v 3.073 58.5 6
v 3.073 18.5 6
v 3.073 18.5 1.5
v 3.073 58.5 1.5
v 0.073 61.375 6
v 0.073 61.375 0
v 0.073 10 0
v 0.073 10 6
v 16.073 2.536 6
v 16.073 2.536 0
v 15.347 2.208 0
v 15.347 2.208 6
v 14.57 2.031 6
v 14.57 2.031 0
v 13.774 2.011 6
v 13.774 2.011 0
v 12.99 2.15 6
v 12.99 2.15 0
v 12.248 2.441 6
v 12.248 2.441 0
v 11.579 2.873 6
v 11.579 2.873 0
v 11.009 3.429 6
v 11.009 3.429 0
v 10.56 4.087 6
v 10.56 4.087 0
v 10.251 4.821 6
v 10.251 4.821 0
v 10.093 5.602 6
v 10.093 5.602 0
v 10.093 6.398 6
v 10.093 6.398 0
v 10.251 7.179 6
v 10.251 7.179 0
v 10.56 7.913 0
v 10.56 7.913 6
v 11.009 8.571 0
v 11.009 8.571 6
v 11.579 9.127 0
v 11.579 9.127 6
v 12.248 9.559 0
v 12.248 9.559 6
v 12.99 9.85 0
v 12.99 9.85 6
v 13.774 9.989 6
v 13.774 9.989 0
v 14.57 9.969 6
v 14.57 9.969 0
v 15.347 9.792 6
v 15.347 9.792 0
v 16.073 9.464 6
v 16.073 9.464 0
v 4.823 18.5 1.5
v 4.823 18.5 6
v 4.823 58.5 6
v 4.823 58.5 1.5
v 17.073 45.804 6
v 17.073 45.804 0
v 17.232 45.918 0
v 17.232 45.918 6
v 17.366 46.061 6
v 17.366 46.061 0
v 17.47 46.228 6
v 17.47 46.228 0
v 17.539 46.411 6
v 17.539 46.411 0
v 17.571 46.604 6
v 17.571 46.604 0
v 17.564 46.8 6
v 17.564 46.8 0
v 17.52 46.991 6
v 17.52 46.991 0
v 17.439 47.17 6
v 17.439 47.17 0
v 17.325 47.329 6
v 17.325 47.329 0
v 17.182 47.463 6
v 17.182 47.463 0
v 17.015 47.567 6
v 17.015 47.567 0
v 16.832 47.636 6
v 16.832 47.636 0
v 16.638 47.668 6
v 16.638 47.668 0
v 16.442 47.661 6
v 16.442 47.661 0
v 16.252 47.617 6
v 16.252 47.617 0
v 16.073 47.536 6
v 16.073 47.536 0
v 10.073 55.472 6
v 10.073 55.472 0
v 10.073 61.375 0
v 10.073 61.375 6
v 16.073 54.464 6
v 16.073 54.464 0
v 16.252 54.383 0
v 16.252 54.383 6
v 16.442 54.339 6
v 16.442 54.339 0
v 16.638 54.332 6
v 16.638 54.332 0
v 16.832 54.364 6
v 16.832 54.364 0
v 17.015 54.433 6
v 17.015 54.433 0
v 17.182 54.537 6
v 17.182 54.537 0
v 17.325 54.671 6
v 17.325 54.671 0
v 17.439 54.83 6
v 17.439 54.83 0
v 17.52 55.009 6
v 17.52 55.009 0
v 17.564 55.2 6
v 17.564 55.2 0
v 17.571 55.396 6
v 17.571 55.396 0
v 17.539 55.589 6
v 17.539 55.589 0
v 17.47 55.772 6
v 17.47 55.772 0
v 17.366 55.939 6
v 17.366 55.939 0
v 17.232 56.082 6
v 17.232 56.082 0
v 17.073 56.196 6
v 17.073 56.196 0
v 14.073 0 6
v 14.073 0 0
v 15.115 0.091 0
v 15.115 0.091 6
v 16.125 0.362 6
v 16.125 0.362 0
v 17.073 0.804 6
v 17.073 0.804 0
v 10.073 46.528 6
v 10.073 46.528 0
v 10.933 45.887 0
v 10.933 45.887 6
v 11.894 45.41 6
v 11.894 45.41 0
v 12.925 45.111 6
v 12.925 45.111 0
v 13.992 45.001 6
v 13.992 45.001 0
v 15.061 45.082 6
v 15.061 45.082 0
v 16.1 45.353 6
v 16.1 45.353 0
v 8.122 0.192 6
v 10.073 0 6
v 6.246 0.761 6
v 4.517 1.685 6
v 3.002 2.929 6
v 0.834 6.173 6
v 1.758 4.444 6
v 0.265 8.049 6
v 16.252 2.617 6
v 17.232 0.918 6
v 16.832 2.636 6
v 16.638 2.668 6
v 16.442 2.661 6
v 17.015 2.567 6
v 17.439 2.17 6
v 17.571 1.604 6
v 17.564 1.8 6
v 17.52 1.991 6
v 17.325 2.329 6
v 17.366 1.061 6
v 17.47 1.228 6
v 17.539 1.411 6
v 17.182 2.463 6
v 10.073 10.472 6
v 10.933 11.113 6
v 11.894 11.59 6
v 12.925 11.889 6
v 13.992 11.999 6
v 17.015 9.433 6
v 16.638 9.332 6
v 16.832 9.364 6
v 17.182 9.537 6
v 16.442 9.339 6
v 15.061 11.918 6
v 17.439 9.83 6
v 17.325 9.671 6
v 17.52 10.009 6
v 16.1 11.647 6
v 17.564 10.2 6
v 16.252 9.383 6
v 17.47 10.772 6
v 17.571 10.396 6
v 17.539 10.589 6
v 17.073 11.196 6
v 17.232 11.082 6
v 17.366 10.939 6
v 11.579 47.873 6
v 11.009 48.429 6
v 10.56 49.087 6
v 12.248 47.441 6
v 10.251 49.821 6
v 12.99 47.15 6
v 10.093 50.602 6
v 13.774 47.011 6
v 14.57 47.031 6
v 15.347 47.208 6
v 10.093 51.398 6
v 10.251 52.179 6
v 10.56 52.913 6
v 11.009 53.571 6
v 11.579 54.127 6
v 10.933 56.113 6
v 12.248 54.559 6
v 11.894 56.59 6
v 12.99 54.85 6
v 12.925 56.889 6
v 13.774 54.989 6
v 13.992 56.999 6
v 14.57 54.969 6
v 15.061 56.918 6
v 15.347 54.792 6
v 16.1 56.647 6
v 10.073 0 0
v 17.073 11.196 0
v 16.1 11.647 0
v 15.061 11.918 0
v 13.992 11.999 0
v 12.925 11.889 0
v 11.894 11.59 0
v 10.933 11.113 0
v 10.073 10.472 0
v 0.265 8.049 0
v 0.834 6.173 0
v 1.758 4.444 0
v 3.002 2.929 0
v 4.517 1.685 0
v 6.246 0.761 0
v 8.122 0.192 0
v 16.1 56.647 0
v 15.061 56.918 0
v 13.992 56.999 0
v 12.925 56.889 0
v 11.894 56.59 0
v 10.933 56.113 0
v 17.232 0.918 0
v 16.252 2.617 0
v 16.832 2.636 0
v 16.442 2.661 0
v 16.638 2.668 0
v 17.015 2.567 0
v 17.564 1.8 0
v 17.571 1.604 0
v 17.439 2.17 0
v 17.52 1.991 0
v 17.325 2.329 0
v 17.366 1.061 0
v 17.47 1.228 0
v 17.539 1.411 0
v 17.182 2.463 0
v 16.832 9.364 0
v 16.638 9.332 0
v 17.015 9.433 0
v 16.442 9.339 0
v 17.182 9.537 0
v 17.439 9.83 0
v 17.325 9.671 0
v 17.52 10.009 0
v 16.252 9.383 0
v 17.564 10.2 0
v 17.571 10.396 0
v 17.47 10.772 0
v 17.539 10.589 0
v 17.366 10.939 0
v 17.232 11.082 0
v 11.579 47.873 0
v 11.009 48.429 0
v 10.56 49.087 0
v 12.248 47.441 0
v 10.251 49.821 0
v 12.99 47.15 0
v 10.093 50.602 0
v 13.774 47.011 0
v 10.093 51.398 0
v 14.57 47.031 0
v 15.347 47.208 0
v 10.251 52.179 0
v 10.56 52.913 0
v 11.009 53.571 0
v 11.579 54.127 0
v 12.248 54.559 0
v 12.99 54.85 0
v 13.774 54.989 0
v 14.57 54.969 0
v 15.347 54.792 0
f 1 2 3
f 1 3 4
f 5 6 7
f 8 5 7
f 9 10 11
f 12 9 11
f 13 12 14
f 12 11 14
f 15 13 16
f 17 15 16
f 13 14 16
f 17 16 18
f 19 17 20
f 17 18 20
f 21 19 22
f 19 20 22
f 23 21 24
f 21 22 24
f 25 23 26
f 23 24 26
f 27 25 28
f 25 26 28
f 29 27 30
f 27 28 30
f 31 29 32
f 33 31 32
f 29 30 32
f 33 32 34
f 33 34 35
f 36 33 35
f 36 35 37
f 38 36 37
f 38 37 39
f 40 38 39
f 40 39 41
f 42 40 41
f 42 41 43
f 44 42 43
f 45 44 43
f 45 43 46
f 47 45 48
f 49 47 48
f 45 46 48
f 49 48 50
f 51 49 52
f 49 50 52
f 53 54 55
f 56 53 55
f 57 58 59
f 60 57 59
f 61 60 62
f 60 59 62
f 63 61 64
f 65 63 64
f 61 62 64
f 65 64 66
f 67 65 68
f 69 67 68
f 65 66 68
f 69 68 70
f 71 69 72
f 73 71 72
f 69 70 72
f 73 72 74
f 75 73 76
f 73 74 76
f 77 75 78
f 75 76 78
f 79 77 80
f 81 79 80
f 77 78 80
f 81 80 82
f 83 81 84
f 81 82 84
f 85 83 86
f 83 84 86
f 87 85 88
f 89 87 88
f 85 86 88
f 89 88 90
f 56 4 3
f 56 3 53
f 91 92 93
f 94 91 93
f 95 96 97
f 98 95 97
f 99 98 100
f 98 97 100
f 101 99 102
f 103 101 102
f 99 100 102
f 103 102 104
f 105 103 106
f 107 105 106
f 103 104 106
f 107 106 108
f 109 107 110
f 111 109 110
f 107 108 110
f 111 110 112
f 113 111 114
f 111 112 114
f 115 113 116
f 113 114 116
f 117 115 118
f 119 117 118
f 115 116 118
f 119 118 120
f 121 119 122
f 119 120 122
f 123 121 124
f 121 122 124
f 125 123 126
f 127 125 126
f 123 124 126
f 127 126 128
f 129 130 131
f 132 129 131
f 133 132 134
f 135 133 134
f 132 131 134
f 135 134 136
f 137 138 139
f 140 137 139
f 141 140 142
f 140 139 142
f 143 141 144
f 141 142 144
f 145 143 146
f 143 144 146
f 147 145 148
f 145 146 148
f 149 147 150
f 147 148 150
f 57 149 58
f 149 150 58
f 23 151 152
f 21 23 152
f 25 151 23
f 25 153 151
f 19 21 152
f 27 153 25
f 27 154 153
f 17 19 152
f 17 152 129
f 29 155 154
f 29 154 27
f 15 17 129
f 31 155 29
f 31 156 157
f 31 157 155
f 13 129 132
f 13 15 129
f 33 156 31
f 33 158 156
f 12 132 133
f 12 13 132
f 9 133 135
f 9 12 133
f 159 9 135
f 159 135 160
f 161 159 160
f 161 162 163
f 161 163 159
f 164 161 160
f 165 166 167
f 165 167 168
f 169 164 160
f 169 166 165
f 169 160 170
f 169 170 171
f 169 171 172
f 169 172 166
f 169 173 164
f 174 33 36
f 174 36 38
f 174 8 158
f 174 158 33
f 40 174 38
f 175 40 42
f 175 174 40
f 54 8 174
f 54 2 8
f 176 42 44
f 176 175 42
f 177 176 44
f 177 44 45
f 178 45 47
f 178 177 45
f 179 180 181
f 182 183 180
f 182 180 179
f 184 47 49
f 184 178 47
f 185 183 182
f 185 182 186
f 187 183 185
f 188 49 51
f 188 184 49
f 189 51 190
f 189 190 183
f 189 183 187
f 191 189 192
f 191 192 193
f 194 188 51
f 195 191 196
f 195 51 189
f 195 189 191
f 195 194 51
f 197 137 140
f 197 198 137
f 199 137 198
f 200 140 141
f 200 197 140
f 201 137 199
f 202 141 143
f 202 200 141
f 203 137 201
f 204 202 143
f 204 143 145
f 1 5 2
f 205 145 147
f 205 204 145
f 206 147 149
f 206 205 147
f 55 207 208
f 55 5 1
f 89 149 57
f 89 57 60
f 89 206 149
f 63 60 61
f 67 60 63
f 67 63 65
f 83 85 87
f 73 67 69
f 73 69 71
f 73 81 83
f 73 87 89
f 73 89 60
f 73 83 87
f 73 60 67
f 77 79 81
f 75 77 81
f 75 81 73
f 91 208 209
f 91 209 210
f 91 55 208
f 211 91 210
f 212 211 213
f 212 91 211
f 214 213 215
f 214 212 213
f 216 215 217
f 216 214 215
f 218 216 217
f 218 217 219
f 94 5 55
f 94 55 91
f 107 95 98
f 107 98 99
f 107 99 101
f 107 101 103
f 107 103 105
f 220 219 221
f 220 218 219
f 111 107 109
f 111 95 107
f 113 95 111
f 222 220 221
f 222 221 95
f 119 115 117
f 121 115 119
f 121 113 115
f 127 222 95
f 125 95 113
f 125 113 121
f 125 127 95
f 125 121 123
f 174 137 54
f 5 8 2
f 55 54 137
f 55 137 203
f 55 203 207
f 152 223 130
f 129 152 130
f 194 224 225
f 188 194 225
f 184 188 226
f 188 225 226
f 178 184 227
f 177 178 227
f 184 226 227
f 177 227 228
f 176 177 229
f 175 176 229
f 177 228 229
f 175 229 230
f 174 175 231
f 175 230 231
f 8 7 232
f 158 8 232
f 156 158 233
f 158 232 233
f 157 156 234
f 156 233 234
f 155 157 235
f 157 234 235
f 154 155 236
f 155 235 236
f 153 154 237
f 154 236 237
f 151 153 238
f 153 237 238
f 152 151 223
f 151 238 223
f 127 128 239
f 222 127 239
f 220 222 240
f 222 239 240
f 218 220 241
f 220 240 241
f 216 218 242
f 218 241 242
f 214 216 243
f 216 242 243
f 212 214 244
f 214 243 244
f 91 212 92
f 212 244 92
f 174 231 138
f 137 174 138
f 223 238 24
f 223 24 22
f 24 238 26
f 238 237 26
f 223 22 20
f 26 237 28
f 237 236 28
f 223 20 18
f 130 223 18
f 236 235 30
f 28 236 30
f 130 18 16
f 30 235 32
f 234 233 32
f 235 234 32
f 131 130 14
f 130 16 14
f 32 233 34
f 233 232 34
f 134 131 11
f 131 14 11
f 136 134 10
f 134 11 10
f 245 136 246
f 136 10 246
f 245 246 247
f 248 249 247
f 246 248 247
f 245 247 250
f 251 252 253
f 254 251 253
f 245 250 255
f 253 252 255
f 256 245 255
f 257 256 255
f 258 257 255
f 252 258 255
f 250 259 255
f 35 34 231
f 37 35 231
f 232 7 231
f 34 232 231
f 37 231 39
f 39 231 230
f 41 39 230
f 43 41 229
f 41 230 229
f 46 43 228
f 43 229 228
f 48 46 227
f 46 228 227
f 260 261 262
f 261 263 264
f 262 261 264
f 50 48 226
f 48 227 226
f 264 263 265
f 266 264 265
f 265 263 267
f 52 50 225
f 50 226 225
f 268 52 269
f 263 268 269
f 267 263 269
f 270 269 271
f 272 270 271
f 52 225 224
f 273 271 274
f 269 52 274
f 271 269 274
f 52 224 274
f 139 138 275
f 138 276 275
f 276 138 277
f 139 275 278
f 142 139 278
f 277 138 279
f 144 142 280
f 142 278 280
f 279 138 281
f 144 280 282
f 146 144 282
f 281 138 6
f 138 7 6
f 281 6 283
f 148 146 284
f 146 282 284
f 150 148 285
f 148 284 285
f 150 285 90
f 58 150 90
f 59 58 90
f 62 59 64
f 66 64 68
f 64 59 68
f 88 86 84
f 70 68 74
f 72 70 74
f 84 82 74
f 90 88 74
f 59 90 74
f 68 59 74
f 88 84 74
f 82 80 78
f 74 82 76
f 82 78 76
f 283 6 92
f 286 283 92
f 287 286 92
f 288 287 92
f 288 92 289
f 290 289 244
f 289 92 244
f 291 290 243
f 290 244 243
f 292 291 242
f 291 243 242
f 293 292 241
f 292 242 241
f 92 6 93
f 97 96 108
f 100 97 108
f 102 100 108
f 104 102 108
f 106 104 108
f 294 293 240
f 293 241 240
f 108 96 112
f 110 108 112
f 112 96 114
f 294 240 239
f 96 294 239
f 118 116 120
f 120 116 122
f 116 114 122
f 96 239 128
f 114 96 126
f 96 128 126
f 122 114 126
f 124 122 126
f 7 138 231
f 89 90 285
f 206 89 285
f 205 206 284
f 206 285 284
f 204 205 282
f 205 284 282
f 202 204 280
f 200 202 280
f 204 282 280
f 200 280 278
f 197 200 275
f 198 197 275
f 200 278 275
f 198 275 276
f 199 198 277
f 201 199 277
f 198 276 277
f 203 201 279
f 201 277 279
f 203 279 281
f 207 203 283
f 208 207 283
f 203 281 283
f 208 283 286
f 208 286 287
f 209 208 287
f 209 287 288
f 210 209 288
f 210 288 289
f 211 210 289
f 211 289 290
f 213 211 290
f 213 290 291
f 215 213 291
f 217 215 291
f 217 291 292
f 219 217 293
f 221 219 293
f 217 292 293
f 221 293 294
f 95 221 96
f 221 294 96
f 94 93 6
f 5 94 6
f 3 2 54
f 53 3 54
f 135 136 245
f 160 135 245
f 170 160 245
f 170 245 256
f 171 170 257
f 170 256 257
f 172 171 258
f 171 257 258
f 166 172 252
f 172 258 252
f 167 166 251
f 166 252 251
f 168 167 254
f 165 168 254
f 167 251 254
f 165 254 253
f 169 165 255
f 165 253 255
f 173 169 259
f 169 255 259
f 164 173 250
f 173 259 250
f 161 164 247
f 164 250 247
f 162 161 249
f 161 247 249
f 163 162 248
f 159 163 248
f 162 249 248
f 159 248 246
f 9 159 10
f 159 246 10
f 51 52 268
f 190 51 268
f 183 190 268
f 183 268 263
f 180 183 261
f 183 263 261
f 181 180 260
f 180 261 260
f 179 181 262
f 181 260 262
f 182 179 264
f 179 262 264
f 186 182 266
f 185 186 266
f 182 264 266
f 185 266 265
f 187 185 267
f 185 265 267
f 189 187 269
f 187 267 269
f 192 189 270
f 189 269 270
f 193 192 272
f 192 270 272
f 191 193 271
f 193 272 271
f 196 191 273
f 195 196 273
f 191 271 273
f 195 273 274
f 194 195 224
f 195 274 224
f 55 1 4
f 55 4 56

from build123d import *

# Parameters (mm, degrees)
BOSS_EXTRUDE_BASE_DEPTH = 6
SKETCH4_W               = 1.75
SKETCH4_H               = 40
CUT_EXTRUDE_SLOT_DEPTH  = 4.5


with BuildPart() as part:
    # Sketch1 → Boss-Extrude-Base (new body)
    with BuildSketch(Plane.XY):
        with BuildLine():
            Line((10.072988134, 10.472135955), (10.072988134, 46.527864045))
            ThreePointArc((10.072988134, 46.527864045), (13.45569569, 45.031838638), (17.072988134, 45.803847577))
            ThreePointArc((17.072988134, 45.803847577), (17.439013538, 47.169872981), (16.072988134, 47.535898385))
            ThreePointArc((16.072988134, 47.535898385), (10.072988134, 51), (16.072988134, 54.464101615))
            ThreePointArc((16.072988134, 54.464101615), (17.439013538, 54.830127019), (17.072988134, 56.196152423))
            ThreePointArc((17.072988134, 56.196152423), (13.45569569, 56.968161362), (10.072988134, 55.472135955))
            Line((10.072988134, 55.472135955), (10.072988134, 61.375))
            Line((10.072988134, 61.375), (0.072988134, 61.375))
            Line((0.072988134, 61.375), (0.072988134, 10))
            ThreePointArc((0.072988134, 10), (3.001920322, 2.928932188), (10.072988134, 0))
            Line((10.072988134, 0), (14.072988134, 0))
            ThreePointArc((14.072988134, 0), (15.625902405, 0.204445042), (17.072988134, 0.803847577))
            ThreePointArc((17.072988134, 0.803847577), (17.439013538, 2.169872981), (16.072988134, 2.535898385))
            ThreePointArc((16.072988134, 2.535898385), (10.072988134, 6), (16.072988134, 9.464101615))
            ThreePointArc((16.072988134, 9.464101615), (17.439013538, 9.830127019), (17.072988134, 11.196152423))
            ThreePointArc((17.072988134, 11.196152423), (13.45569569, 11.968161362), (10.072988134, 10.472135955))
        make_face()
    extrude(amount=BOSS_EXTRUDE_BASE_DEPTH)

    # Sketch4 → Cut-Extrude-Slot (cut)
    with BuildSketch(Plane.XY.offset(6)):
        with Locations((3.947988134, 38.5)):
            Rectangle(SKETCH4_W, SKETCH4_H)
    extrude(amount=-CUT_EXTRUDE_SLOT_DEPTH, mode=Mode.SUBTRACT)


solid = part.part
